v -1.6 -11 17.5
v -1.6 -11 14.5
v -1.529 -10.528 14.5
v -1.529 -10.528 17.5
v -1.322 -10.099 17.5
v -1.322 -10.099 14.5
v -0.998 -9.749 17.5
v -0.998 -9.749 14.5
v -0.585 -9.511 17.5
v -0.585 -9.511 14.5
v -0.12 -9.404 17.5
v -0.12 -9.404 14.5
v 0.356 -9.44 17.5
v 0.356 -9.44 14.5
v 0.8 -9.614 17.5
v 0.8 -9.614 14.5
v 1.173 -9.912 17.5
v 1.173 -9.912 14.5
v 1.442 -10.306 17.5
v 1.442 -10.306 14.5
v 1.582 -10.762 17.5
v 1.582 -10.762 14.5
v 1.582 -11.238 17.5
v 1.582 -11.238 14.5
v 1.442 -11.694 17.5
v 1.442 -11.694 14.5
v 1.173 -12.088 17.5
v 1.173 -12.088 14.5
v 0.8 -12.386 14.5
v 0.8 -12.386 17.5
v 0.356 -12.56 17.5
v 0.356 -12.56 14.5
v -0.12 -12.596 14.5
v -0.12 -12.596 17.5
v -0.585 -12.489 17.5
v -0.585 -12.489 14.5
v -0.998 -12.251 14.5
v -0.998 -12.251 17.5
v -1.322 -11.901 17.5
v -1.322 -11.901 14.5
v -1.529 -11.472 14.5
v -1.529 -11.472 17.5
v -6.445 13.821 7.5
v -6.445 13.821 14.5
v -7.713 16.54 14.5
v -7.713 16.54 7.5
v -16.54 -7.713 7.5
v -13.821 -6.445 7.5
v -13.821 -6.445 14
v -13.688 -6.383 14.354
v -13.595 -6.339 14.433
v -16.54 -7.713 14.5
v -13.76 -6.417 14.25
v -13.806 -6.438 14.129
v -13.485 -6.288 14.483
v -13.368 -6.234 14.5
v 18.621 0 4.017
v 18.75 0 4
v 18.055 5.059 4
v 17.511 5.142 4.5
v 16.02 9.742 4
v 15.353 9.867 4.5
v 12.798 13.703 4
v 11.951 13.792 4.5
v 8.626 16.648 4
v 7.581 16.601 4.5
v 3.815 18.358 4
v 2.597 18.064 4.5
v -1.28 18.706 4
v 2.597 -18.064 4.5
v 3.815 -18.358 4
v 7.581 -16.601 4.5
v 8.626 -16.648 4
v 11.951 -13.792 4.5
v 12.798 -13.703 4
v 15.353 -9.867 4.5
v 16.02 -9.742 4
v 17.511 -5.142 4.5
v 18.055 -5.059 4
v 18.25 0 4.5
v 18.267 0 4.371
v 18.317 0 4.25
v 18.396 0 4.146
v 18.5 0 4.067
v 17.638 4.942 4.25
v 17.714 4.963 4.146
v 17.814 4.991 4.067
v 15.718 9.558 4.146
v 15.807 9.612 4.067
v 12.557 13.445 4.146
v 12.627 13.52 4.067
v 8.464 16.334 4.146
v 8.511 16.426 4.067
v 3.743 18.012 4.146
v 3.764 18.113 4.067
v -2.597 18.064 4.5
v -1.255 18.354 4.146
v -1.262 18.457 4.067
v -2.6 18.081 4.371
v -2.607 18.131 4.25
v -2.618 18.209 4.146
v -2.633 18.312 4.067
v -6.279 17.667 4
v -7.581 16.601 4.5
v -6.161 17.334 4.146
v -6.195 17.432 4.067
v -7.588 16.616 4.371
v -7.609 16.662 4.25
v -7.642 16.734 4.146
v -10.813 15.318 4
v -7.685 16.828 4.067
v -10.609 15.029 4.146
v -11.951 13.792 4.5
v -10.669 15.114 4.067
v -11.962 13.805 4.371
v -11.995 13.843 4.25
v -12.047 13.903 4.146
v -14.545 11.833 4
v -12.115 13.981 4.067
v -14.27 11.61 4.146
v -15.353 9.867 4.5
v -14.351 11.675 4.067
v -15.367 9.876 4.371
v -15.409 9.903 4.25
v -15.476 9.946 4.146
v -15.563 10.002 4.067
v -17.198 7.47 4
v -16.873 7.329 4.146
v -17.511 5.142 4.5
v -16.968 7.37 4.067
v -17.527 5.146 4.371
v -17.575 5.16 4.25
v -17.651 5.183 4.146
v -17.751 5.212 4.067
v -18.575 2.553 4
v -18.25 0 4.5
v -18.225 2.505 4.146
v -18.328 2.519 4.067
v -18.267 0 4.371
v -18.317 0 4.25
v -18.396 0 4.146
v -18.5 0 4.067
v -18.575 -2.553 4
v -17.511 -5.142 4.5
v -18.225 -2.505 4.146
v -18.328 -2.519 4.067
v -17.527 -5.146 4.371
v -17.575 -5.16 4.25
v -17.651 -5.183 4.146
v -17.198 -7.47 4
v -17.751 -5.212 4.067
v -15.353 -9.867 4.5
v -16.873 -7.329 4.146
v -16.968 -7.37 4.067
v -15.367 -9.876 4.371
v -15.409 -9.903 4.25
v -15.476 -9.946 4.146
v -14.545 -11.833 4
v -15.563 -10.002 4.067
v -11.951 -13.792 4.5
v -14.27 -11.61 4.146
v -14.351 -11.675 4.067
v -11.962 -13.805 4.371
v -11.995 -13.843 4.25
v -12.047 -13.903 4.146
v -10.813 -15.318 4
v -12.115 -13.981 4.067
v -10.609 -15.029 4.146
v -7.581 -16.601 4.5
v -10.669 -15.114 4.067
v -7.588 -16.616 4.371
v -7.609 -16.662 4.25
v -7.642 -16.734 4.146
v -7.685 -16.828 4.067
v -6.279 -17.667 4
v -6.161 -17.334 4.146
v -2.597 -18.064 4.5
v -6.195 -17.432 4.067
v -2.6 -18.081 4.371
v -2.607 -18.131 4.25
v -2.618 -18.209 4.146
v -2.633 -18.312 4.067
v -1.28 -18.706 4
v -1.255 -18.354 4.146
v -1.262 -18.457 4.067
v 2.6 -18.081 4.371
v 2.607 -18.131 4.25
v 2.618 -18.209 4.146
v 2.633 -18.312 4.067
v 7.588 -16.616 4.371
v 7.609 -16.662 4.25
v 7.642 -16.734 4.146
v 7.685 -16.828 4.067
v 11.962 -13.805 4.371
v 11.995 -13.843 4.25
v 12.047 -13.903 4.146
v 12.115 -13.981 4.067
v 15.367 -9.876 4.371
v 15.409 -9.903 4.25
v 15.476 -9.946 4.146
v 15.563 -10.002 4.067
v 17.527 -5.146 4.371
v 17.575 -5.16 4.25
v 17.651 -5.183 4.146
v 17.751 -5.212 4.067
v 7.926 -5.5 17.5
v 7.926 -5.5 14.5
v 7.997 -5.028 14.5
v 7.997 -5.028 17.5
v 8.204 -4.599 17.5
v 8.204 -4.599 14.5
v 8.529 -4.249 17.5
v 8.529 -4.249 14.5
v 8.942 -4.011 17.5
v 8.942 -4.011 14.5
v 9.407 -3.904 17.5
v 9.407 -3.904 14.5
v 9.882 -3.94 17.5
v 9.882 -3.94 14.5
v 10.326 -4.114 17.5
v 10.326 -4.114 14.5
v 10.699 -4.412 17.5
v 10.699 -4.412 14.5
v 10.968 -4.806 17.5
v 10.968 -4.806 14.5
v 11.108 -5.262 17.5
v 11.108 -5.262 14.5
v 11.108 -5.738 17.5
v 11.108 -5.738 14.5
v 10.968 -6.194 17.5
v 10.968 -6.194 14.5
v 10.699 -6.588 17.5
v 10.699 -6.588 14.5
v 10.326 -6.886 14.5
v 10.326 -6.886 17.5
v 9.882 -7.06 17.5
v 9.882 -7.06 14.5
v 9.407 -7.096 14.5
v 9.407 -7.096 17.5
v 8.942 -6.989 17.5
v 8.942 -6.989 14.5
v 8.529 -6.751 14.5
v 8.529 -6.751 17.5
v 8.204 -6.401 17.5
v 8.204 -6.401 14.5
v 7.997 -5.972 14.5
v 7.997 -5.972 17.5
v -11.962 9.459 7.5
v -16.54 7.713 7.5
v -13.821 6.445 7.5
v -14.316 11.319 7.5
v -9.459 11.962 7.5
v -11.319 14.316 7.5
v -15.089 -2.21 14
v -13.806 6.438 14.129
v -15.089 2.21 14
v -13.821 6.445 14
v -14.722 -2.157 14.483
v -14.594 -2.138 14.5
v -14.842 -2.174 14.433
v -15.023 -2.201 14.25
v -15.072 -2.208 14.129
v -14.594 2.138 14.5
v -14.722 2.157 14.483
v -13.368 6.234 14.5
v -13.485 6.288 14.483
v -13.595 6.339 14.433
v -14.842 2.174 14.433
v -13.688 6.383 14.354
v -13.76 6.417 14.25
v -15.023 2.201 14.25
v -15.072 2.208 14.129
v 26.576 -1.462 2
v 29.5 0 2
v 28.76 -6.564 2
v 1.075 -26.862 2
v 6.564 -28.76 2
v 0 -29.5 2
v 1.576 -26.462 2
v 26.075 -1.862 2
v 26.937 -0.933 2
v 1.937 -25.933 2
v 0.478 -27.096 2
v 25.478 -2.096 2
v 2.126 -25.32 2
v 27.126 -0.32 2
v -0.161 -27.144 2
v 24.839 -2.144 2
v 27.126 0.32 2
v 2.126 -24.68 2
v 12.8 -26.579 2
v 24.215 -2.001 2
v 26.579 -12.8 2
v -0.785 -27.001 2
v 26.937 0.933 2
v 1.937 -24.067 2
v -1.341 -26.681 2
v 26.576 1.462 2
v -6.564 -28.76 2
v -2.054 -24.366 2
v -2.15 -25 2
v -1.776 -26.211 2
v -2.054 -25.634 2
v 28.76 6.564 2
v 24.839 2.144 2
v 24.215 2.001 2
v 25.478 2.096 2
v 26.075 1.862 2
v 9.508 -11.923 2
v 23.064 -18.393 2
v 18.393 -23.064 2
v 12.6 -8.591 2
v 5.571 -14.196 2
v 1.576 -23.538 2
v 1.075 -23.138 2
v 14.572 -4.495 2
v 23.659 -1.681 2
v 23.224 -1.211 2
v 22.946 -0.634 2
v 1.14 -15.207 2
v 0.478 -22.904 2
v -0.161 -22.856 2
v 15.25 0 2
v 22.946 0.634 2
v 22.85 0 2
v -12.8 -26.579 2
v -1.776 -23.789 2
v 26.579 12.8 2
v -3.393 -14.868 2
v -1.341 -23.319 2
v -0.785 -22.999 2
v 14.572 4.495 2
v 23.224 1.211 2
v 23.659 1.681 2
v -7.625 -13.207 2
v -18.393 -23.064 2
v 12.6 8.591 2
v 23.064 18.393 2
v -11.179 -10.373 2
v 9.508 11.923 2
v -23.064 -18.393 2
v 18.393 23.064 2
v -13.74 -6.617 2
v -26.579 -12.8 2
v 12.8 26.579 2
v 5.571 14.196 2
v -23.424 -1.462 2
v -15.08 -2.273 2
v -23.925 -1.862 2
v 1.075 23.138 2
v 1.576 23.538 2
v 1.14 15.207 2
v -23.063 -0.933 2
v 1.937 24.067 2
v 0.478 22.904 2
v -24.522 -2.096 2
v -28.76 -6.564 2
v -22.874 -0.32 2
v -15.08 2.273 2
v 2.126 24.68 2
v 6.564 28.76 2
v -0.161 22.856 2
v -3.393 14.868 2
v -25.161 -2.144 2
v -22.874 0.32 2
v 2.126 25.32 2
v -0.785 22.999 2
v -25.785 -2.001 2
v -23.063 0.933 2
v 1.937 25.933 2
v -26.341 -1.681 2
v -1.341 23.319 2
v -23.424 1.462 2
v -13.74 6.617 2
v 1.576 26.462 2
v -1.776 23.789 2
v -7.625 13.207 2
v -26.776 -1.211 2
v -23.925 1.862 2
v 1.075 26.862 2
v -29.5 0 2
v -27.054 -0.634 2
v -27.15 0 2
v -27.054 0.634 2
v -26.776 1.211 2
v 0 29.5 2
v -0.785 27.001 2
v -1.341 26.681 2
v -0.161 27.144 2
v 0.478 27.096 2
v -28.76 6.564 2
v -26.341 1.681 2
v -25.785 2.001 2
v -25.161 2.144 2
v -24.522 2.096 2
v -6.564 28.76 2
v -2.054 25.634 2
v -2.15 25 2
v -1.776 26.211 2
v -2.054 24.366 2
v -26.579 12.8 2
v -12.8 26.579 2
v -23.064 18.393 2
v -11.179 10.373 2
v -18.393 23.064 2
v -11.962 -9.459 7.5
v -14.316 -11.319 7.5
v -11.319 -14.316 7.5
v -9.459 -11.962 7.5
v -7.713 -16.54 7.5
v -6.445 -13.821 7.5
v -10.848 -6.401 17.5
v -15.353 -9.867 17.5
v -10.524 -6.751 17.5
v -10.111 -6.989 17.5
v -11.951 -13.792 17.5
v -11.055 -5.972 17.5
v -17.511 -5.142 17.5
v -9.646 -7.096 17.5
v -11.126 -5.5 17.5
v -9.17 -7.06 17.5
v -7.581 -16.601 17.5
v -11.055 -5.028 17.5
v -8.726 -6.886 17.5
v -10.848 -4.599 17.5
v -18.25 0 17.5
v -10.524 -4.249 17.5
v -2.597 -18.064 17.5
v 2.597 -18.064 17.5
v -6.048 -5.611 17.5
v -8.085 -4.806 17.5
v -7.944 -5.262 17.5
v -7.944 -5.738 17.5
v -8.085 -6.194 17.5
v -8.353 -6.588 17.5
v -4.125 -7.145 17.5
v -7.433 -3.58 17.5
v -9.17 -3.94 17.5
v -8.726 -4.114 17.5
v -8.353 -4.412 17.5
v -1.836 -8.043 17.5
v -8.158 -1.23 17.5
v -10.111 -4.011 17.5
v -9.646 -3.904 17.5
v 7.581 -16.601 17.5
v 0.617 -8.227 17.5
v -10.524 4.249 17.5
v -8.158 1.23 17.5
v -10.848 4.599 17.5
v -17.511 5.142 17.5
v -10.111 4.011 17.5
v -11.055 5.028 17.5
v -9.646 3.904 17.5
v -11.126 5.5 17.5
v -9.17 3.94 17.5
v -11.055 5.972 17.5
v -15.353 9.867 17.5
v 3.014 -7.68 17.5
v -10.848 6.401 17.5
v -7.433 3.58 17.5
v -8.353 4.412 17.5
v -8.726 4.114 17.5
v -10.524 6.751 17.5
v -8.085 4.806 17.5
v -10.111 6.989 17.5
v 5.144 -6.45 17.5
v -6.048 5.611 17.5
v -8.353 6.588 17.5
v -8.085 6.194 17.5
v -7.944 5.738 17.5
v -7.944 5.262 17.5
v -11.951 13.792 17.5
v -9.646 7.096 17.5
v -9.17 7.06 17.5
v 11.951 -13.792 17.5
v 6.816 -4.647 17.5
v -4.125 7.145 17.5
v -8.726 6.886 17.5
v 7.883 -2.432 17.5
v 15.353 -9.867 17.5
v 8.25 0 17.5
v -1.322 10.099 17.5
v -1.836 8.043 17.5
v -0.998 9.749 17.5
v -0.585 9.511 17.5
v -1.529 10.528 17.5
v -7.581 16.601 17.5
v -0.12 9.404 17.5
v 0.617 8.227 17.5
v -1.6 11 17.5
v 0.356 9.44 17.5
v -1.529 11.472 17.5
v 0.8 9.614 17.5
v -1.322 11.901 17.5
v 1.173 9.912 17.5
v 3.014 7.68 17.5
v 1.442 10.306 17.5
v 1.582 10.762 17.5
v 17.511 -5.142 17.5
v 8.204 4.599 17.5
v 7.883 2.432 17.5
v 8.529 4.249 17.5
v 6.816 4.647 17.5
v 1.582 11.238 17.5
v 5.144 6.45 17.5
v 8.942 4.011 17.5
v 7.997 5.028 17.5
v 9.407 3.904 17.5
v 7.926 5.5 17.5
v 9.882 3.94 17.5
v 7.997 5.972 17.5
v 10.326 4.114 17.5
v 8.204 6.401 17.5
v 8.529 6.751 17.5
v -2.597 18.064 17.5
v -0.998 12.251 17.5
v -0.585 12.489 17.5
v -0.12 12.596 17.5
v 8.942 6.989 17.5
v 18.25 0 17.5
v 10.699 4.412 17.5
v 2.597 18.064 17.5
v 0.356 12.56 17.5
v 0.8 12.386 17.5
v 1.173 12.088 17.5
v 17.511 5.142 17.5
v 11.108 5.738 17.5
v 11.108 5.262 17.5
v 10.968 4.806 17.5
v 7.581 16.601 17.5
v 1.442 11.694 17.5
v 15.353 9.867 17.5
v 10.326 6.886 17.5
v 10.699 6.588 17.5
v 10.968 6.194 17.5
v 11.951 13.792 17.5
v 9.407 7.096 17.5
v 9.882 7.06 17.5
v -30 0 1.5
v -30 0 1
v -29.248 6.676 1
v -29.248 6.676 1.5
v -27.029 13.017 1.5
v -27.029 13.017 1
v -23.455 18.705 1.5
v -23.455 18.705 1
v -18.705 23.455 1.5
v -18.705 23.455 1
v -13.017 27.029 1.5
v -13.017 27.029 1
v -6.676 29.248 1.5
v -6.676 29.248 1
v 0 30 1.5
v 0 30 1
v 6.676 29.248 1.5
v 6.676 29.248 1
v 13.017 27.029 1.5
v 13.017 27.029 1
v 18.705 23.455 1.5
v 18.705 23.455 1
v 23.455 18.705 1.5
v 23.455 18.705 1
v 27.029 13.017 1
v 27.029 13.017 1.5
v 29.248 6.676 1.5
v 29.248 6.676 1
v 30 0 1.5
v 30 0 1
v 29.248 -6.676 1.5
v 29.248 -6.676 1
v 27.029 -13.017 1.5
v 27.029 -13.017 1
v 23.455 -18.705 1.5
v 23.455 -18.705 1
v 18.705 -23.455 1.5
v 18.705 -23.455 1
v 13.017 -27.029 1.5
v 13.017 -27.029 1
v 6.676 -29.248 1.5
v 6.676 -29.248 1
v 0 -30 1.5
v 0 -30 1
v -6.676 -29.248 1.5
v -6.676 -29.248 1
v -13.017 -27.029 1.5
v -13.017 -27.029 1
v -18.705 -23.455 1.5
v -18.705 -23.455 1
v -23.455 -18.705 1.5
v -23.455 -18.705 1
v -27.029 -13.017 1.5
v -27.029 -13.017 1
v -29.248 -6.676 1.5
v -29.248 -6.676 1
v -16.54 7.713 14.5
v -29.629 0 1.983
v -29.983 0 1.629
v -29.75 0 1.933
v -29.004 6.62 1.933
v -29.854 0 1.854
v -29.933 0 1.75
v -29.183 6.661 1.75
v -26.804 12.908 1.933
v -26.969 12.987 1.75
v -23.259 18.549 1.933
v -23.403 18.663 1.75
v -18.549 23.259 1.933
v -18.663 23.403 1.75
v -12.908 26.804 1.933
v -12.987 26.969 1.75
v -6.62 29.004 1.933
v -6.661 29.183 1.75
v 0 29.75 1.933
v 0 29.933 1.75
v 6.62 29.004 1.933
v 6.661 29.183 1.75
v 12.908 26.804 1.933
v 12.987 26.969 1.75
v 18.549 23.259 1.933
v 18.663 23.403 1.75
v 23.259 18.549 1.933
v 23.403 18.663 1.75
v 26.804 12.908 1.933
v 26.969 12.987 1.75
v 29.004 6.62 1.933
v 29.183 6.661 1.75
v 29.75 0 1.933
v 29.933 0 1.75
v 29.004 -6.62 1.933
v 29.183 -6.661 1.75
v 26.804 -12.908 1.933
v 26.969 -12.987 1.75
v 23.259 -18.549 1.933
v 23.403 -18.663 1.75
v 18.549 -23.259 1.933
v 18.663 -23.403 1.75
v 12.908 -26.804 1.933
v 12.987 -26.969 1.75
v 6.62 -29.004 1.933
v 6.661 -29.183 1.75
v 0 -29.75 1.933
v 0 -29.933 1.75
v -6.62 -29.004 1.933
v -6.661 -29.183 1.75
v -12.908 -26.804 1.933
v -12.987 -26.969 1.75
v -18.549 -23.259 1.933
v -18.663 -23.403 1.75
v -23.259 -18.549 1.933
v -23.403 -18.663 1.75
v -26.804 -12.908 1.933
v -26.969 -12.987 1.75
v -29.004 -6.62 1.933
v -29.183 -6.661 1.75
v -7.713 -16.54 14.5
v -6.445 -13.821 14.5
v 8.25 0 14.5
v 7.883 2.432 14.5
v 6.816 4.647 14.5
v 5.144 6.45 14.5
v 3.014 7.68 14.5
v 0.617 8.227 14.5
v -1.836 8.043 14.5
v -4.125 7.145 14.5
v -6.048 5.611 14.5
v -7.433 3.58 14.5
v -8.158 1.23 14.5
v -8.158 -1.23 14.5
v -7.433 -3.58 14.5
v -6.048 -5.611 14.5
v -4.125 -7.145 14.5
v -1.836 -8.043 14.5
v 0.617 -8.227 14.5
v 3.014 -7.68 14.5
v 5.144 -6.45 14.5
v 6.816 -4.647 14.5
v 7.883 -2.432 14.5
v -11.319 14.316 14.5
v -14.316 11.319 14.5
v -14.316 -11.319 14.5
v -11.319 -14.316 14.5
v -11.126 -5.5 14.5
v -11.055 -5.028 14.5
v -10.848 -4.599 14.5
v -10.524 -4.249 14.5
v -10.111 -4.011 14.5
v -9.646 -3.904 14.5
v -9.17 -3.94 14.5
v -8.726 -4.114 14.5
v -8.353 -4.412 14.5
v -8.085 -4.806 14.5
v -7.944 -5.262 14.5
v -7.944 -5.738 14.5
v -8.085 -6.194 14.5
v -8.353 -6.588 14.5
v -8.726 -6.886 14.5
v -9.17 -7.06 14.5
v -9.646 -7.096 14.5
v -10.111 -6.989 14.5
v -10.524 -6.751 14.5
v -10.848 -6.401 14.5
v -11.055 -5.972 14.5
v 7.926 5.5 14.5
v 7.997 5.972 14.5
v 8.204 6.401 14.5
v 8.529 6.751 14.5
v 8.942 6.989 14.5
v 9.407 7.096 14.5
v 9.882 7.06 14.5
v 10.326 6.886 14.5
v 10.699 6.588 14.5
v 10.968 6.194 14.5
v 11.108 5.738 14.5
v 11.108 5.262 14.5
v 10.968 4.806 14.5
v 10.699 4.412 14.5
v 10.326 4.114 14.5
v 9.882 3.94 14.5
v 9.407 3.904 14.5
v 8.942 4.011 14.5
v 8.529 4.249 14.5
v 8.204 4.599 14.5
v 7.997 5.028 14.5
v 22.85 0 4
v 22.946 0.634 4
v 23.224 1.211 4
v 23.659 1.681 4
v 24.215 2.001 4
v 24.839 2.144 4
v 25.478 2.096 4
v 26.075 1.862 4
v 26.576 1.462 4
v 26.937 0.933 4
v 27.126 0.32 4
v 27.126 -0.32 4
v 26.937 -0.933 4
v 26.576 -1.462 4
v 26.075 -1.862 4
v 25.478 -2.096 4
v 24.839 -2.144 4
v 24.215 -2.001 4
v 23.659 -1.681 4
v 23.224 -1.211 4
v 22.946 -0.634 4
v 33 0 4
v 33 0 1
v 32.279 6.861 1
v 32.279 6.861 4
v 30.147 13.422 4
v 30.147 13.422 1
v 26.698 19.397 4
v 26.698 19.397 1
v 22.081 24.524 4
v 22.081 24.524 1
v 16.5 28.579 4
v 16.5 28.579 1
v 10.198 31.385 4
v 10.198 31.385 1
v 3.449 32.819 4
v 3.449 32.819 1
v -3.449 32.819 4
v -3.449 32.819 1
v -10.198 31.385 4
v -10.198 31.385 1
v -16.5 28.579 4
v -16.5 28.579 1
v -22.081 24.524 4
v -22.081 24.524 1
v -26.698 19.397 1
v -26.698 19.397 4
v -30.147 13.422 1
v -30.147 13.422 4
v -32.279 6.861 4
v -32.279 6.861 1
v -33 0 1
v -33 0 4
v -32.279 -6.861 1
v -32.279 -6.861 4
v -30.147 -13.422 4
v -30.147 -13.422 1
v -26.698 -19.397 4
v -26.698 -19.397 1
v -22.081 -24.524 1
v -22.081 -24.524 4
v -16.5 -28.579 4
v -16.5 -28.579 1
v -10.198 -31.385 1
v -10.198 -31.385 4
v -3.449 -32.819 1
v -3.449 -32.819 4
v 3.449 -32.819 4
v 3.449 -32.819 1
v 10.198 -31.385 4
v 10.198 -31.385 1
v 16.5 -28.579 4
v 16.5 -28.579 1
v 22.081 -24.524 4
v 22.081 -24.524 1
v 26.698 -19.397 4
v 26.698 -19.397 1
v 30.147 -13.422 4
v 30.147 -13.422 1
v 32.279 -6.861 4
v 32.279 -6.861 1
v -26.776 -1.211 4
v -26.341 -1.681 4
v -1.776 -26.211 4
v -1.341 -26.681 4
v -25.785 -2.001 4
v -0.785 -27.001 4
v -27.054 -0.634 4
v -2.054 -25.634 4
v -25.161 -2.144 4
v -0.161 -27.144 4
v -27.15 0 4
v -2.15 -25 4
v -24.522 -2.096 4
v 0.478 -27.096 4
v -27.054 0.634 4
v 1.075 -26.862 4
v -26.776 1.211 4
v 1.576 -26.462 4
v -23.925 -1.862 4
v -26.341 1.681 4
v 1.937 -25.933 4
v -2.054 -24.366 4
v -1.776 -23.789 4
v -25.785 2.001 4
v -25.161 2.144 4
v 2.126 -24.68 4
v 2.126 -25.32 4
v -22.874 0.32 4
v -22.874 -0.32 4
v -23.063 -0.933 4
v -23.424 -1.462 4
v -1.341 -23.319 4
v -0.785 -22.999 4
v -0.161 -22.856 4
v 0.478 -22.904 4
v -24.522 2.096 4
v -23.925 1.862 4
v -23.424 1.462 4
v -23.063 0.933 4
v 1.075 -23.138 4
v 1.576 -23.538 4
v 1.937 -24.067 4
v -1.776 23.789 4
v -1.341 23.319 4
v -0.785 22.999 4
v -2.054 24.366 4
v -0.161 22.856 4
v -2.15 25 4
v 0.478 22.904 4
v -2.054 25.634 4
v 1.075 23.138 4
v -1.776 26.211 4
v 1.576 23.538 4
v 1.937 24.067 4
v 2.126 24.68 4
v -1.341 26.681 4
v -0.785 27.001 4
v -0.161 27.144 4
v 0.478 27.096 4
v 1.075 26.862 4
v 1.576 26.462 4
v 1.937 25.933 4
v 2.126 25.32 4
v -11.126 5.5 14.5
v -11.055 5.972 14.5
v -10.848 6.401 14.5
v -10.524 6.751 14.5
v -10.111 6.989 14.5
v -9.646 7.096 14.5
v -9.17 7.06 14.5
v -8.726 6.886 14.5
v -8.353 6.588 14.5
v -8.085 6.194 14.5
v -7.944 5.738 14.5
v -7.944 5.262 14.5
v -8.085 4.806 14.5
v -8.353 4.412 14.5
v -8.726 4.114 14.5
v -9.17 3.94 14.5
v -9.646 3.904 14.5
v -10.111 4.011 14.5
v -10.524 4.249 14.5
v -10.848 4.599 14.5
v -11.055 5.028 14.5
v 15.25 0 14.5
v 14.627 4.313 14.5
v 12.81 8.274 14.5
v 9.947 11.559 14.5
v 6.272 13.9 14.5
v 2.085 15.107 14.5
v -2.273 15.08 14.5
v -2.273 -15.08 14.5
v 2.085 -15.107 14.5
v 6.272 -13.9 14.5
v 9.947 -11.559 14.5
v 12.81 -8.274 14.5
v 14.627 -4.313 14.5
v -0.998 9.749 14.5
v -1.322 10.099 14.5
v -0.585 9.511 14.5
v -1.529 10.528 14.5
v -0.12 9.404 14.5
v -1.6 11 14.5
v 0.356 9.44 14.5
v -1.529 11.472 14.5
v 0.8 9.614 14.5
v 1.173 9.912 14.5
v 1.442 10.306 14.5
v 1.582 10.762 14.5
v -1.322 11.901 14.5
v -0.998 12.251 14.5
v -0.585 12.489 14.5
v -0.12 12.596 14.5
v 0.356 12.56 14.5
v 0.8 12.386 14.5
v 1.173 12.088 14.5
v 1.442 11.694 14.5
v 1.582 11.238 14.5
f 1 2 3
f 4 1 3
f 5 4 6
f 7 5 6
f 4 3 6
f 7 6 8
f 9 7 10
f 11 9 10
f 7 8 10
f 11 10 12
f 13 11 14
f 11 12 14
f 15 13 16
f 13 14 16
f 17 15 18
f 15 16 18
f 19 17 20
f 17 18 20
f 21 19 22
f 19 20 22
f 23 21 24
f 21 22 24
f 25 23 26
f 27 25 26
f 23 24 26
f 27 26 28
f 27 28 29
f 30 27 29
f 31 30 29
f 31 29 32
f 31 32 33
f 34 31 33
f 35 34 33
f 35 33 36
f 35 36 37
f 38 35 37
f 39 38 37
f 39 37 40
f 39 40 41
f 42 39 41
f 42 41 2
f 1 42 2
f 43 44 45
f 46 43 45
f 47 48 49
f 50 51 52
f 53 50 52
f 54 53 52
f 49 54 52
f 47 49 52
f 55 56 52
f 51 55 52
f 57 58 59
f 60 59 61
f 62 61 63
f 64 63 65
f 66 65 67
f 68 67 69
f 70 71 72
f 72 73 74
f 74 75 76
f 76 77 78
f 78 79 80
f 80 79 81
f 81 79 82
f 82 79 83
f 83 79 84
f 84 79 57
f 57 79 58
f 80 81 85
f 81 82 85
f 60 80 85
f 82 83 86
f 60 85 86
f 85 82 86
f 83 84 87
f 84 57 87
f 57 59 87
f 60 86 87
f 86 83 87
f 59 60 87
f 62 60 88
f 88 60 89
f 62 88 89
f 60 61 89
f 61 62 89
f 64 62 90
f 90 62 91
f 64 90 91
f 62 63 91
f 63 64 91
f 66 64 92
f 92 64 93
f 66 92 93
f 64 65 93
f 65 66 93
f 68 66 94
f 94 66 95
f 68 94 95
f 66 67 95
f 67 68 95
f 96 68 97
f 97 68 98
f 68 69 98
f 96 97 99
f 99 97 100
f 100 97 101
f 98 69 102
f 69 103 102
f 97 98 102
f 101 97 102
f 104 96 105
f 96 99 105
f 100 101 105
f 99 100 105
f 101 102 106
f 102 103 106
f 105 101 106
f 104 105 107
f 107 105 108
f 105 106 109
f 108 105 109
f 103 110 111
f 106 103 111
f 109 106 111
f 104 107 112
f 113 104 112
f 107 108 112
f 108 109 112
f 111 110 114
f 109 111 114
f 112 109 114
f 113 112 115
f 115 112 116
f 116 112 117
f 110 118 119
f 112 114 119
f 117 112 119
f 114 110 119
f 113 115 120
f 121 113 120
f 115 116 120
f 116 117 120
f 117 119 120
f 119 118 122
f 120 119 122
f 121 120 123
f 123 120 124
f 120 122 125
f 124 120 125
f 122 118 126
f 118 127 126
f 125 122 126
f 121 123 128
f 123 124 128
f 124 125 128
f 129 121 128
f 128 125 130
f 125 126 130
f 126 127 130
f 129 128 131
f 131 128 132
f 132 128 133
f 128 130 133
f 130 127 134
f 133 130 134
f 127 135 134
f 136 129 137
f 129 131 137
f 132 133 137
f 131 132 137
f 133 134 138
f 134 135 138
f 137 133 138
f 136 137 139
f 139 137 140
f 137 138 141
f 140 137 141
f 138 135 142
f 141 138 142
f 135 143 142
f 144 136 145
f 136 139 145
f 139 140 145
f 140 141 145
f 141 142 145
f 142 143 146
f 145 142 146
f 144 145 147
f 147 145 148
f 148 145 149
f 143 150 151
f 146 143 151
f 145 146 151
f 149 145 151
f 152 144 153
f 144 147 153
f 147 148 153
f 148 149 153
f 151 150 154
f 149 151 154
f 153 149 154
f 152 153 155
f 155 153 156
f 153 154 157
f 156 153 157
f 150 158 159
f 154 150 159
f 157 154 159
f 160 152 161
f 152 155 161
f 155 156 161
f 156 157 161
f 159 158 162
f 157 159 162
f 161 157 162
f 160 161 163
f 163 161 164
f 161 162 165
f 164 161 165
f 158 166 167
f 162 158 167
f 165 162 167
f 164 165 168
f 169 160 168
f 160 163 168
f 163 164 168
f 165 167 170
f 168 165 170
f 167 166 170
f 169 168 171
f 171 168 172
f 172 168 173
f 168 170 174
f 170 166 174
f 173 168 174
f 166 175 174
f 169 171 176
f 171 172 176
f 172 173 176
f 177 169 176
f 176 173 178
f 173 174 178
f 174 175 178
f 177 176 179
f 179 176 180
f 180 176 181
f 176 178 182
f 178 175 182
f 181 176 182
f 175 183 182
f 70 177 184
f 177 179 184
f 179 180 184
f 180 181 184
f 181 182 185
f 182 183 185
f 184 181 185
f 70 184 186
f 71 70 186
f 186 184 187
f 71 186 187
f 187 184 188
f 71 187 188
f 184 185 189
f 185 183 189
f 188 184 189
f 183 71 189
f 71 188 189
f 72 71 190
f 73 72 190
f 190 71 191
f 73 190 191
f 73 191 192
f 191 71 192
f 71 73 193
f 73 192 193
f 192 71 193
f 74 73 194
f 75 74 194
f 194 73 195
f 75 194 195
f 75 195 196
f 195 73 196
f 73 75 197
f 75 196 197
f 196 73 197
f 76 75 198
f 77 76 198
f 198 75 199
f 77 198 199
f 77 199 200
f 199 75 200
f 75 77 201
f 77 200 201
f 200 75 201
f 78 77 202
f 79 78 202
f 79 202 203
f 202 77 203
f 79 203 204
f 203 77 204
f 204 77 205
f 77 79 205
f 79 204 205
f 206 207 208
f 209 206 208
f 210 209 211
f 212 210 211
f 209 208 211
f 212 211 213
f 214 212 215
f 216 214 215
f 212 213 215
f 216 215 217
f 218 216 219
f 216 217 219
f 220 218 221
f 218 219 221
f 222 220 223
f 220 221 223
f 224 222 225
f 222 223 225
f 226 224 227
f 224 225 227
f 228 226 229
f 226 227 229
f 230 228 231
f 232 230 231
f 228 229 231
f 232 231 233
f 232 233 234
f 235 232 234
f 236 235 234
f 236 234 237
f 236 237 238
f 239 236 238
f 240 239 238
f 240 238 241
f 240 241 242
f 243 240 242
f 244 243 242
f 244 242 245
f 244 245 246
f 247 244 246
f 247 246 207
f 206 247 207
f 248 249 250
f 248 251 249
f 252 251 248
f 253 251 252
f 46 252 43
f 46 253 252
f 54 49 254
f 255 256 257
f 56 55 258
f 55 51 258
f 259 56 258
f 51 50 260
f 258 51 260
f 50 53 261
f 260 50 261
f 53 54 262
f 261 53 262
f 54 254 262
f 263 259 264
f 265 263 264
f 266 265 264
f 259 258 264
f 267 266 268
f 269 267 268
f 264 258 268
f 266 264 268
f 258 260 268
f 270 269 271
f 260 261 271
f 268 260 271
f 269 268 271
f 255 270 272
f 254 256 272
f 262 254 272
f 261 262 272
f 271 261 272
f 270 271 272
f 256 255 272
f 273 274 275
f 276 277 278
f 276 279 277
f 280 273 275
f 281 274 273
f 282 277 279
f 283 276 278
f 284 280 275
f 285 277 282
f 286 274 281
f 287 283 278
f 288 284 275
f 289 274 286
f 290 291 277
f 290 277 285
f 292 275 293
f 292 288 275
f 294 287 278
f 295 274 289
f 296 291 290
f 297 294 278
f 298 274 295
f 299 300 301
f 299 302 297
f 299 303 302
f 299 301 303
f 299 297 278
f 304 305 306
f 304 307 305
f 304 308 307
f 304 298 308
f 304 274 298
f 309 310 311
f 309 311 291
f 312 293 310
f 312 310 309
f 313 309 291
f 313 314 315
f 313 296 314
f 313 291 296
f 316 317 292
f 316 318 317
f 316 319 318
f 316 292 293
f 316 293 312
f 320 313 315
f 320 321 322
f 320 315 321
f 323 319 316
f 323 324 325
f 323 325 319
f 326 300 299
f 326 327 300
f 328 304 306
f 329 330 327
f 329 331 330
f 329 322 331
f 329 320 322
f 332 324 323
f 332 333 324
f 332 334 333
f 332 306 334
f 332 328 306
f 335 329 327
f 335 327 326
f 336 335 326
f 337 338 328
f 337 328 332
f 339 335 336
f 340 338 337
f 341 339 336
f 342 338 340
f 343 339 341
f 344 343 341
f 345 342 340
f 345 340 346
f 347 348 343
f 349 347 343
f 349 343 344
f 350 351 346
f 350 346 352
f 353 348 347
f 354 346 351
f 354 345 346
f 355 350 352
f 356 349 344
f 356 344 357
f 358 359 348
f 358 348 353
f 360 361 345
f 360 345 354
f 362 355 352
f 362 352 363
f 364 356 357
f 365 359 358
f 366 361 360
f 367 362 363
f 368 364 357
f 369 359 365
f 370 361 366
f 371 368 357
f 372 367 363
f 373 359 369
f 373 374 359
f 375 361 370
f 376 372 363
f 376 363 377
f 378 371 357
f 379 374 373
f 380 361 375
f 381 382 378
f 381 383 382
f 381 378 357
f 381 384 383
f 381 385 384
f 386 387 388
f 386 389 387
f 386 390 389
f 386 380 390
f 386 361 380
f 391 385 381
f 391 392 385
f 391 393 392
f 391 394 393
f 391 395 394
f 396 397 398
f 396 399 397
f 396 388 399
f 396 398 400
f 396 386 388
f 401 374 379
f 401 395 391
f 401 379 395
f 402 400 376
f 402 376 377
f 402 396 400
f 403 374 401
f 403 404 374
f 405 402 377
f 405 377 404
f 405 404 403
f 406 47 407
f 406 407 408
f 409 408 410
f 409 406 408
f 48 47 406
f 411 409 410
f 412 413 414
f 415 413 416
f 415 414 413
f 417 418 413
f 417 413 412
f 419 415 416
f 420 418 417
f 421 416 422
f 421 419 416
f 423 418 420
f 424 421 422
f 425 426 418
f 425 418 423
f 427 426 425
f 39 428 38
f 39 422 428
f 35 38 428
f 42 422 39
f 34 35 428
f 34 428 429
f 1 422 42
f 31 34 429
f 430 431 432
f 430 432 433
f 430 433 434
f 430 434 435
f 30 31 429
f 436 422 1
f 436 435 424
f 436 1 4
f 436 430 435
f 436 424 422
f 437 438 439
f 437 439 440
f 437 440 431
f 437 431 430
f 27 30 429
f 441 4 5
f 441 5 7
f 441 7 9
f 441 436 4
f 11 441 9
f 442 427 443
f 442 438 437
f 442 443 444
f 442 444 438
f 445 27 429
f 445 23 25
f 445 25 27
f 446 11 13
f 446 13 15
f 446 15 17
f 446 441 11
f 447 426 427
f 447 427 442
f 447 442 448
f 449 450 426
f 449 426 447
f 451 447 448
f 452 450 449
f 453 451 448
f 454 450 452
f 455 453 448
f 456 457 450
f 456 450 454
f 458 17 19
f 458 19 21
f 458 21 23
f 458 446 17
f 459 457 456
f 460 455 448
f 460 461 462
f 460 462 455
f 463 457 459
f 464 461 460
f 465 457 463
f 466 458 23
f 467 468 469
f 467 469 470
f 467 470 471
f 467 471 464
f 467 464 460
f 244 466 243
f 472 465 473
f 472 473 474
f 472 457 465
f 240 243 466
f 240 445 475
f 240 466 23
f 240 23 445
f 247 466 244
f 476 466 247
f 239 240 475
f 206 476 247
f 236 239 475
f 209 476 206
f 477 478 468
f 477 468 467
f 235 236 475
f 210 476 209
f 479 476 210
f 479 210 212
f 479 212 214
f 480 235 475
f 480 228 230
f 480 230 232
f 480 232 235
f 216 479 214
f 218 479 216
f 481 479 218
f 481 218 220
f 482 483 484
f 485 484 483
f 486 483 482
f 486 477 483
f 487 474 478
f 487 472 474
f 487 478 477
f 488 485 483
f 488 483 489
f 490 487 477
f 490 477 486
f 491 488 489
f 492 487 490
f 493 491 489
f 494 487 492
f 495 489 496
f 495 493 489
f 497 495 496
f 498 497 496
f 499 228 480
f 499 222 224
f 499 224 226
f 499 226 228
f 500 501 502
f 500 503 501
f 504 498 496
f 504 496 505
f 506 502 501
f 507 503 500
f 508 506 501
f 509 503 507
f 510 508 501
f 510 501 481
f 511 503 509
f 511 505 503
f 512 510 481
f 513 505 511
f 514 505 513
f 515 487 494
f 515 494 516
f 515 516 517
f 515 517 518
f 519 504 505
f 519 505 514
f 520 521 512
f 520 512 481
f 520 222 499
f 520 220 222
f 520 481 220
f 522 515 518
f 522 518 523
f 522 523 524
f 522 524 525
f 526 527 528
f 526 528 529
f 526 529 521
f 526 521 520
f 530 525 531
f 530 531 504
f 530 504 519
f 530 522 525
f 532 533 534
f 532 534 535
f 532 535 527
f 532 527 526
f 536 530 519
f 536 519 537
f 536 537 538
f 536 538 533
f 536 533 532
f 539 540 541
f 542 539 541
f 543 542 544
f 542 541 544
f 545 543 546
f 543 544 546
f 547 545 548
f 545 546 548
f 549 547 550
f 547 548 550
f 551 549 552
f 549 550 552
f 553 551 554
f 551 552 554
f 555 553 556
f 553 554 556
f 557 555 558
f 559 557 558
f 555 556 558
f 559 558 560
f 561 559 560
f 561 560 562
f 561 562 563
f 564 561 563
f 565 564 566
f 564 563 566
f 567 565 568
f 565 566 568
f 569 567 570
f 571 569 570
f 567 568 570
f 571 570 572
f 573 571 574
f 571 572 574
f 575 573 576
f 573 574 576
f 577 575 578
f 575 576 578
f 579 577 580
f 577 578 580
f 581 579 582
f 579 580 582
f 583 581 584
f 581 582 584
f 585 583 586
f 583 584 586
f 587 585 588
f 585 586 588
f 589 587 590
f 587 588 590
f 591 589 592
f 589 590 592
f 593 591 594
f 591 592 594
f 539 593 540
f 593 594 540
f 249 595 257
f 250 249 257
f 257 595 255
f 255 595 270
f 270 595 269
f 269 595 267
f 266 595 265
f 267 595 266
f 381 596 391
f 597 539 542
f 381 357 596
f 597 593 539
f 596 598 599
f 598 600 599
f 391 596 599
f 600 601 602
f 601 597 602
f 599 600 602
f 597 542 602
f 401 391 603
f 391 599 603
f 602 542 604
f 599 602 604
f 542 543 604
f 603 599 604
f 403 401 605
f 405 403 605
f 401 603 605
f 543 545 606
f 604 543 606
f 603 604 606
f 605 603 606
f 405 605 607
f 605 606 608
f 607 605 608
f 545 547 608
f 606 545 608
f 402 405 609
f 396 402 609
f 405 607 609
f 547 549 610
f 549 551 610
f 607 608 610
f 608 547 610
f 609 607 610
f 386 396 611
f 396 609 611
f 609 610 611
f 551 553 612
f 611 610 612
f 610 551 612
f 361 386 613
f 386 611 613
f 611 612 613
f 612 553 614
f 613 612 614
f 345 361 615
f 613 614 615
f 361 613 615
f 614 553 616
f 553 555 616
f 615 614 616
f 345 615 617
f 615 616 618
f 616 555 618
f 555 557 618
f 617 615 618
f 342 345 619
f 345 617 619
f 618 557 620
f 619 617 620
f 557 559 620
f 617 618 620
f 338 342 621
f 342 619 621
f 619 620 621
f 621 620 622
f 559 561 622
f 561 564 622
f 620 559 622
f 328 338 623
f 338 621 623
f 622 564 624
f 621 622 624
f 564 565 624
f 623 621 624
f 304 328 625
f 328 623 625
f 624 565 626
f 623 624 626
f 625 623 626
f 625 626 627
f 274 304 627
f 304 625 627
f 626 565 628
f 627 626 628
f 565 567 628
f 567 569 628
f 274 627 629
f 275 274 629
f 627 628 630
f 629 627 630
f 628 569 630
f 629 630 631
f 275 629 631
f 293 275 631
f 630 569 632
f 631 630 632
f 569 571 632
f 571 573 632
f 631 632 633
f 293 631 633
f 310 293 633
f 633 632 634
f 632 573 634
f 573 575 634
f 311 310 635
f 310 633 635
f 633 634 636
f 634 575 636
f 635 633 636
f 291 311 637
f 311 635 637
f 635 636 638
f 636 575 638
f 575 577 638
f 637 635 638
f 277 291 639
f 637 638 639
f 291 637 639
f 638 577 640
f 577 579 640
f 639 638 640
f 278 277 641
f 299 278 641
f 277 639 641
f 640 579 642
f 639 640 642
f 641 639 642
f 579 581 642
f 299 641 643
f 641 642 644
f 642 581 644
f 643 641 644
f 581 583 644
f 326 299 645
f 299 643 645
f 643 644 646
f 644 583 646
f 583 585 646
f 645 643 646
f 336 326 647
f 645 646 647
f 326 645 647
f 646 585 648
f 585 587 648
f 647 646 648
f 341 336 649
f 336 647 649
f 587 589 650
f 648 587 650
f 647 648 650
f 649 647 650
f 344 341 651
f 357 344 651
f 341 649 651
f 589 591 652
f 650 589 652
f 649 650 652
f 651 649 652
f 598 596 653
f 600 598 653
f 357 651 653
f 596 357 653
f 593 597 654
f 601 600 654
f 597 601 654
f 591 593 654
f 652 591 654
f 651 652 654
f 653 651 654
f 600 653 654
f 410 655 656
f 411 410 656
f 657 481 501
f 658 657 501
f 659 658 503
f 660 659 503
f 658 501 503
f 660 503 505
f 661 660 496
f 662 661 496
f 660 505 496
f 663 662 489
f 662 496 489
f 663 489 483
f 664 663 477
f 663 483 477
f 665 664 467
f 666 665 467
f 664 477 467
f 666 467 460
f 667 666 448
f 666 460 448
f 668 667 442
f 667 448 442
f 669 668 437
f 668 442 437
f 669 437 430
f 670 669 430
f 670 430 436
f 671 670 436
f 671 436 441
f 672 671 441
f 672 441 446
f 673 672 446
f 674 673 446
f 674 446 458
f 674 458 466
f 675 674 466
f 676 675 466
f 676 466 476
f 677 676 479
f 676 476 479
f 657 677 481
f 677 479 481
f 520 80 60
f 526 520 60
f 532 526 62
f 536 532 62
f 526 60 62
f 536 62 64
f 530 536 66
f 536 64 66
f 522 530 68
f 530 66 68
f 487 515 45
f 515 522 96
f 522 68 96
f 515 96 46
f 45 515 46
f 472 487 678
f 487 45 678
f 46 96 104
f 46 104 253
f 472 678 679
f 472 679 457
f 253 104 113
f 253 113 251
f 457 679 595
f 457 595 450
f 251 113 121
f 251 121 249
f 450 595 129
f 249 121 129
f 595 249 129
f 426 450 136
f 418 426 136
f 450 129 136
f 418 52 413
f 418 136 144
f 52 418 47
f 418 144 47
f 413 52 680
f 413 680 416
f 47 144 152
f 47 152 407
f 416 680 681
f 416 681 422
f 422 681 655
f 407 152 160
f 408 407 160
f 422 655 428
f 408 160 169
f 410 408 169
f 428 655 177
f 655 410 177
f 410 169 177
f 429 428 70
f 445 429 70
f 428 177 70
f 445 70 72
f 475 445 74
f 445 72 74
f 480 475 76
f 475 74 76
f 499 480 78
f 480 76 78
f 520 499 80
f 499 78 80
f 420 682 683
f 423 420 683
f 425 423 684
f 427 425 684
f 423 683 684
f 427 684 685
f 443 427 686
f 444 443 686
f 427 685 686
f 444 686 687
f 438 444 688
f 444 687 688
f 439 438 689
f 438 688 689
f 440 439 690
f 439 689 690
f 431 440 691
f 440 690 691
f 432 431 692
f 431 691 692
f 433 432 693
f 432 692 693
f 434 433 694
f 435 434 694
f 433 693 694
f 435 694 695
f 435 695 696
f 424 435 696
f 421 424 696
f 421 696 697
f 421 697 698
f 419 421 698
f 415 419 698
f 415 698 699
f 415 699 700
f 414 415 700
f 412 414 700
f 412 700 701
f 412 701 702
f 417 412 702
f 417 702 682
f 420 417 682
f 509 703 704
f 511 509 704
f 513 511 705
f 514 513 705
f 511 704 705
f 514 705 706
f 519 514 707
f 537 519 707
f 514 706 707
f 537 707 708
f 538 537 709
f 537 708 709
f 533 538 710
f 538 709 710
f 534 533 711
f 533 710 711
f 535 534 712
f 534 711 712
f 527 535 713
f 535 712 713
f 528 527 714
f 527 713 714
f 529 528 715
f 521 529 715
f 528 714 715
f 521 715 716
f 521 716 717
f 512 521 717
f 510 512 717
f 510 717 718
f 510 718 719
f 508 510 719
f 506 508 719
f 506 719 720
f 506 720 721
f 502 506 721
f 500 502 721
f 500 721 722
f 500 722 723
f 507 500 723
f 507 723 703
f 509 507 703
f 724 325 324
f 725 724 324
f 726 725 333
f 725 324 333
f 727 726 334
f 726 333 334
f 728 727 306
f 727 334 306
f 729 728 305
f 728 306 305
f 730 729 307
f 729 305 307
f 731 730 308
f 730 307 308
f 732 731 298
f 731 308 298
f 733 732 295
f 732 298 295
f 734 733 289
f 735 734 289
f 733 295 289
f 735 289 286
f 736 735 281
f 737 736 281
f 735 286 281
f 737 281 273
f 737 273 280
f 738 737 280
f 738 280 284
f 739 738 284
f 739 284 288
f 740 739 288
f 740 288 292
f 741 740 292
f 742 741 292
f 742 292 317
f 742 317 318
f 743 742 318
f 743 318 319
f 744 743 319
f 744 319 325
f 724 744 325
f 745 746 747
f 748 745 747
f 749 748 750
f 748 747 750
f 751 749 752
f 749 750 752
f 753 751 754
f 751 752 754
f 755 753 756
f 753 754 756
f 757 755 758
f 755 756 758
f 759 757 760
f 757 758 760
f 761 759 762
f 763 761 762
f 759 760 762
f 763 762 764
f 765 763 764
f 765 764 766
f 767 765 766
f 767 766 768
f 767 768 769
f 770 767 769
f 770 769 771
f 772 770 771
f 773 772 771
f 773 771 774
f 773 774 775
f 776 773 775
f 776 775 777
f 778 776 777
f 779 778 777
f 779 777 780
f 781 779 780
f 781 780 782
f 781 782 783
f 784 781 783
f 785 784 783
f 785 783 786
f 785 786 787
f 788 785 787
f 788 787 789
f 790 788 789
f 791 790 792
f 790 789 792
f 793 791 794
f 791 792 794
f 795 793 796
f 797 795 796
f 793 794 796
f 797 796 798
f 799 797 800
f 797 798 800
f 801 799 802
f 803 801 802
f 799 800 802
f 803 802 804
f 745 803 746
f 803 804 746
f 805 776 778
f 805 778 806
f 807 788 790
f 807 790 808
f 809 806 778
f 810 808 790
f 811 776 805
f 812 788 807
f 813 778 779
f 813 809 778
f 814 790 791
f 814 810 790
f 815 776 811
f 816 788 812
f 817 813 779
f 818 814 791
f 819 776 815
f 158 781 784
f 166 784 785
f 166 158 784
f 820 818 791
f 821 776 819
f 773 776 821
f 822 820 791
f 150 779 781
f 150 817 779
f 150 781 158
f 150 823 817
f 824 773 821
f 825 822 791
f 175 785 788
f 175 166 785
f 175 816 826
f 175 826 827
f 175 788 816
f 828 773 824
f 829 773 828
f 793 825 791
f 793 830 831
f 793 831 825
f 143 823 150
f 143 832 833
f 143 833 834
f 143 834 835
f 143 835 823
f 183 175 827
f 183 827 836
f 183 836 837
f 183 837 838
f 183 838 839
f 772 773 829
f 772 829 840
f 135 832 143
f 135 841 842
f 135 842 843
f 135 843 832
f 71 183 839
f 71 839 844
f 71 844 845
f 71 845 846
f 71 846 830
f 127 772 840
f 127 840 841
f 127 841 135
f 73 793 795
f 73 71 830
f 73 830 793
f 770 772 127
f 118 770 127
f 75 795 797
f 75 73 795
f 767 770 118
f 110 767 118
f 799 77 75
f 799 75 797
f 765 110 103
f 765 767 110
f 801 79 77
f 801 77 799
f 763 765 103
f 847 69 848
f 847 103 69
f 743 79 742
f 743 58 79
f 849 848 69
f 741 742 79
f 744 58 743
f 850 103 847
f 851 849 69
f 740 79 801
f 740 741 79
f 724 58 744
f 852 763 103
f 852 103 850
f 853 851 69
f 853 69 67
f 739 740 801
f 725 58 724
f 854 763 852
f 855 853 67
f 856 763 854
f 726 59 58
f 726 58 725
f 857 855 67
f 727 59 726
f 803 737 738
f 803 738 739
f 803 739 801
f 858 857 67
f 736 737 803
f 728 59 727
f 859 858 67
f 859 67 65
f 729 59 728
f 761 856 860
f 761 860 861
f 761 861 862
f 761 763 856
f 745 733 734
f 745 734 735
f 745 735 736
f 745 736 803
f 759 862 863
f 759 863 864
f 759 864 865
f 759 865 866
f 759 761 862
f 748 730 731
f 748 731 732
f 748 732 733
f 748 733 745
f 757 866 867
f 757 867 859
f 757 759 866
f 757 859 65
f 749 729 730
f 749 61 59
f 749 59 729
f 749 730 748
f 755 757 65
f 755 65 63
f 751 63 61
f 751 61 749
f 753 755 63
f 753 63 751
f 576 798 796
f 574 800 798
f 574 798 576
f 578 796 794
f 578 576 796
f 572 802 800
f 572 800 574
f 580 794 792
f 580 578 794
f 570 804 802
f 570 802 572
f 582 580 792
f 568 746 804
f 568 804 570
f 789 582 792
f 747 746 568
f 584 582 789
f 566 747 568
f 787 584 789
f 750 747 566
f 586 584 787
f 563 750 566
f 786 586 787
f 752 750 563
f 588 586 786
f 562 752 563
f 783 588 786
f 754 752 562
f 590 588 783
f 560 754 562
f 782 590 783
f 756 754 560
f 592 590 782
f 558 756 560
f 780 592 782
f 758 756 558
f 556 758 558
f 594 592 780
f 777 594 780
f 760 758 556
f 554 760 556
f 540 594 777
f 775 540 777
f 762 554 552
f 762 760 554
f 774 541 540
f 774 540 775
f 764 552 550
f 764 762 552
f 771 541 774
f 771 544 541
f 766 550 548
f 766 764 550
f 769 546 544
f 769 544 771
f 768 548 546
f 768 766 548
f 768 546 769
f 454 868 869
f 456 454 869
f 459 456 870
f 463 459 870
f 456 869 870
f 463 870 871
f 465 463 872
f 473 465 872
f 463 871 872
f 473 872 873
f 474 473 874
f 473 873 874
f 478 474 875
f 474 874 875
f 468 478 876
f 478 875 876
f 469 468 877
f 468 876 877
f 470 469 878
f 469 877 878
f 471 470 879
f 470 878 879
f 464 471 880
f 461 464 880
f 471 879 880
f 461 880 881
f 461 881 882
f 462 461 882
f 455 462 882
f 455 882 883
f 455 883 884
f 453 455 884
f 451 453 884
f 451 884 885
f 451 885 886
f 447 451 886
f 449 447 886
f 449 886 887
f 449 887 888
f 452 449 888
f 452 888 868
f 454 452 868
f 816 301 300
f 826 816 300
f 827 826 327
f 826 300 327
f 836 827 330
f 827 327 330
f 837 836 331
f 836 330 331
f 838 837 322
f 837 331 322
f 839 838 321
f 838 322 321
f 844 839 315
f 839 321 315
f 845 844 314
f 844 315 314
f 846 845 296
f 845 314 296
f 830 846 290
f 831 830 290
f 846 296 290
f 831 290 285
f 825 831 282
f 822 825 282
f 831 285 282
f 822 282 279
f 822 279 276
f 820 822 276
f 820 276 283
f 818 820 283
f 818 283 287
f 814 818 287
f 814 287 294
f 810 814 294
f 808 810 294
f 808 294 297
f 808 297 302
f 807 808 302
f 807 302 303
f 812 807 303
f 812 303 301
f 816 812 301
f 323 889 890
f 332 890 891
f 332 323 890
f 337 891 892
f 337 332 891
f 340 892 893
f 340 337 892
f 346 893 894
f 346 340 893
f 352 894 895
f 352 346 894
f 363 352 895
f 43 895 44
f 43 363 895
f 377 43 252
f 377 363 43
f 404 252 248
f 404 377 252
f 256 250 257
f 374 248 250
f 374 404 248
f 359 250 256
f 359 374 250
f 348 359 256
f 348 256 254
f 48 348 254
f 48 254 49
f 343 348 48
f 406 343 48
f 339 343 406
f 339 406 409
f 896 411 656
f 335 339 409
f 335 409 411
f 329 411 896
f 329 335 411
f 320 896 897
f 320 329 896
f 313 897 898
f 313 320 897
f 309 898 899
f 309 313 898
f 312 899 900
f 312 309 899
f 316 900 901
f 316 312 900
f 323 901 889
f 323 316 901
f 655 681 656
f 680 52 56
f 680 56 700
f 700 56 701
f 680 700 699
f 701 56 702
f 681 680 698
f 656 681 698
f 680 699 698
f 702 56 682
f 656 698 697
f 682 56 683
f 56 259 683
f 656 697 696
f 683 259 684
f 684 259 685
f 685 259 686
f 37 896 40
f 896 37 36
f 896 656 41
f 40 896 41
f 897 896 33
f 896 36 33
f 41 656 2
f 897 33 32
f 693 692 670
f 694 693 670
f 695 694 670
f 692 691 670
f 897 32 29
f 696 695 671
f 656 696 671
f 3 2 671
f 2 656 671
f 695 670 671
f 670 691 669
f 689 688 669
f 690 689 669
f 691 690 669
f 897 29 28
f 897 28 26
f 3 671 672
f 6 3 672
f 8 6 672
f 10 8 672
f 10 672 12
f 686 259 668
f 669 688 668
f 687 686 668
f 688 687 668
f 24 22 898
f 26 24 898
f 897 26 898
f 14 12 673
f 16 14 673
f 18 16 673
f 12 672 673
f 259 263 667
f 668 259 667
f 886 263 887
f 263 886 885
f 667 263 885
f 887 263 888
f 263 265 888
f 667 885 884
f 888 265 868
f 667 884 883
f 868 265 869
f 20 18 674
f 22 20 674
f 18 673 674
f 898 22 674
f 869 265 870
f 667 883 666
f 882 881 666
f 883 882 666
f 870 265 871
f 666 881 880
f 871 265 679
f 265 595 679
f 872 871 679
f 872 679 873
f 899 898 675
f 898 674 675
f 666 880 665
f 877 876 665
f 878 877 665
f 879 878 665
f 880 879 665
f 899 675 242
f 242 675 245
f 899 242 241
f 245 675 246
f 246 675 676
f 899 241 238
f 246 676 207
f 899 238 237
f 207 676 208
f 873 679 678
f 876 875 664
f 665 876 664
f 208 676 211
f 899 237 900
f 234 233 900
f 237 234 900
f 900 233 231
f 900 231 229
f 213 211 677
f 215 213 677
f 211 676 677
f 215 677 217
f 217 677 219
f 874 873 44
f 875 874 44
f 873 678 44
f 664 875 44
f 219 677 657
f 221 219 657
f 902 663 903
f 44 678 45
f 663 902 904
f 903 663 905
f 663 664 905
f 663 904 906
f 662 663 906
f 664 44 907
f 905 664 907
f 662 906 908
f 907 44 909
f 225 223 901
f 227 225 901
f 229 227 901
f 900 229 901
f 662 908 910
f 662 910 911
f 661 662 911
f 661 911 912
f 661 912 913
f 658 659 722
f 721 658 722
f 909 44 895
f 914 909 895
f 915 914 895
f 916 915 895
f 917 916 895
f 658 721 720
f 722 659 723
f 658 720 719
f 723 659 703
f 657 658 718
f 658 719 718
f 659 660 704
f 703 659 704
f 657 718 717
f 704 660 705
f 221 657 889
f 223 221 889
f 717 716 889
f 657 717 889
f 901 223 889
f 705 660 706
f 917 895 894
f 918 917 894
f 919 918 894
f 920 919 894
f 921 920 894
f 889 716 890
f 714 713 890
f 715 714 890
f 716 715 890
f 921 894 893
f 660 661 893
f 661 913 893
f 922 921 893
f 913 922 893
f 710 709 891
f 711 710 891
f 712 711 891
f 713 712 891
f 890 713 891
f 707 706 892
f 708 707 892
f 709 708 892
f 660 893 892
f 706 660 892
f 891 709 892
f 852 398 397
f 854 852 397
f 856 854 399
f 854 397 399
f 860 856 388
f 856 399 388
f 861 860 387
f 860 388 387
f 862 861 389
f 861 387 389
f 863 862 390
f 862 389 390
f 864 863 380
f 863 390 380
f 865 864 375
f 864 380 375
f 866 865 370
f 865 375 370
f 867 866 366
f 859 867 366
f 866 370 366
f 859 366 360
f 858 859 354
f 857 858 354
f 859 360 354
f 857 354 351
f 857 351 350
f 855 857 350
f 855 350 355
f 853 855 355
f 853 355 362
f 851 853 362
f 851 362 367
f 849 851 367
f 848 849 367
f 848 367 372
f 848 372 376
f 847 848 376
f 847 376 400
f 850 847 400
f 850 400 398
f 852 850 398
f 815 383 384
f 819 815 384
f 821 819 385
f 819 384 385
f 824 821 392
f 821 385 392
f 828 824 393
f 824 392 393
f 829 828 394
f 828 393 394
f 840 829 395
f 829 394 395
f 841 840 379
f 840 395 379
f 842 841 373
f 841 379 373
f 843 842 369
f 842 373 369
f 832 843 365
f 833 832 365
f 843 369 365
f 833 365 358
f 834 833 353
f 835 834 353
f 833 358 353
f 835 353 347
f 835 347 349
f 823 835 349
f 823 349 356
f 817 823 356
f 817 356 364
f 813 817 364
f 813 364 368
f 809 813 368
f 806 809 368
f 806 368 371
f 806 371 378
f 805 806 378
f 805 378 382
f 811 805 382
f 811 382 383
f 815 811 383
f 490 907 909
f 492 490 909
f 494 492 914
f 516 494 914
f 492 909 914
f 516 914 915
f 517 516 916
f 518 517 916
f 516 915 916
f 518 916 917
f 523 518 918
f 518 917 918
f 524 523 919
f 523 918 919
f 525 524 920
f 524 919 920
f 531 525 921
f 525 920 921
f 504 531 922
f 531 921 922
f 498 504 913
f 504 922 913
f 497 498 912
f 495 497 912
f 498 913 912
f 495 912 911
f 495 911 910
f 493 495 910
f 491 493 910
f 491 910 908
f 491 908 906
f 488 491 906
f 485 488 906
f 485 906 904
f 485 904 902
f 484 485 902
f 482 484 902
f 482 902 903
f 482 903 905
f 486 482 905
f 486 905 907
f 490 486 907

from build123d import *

# Parameters (mm, degrees)
SKETCH1_R            = 33
SKETCH1_R_2          = 15.25
BOSS_EXTRUDE1_DEPTH  = 4
SKETCH2_R            = 18.25
SKETCH2_R_2          = 15.25
BOSS_EXTRUDE2_DEPTH  = 13.5
SKETCH3_R            = 18.25
SKETCH3_R_2          = 8.25
BOSS_EXTRUDE3_DEPTH  = 3
M3_CLEARANCE_HOLE2_D = 3.2
CUT_EXTRUDE2_DEPTH   = 7
SKETCH10_R           = 35
CUT_EXTRUDE3_DEPTH   = 1
M4_CLEARANCE_HOLE1_D = 4.3
FILLET1_R            = 0.5
FILLET2_R            = 0.5
SKETCH13_R           = 30
CUT_EXTRUDE4_DEPTH   = 1
FILLET3_R            = 0.5


with BuildPart() as part:
    # Sketch1 → Boss-Extrude1 (new body)
    with BuildSketch(Plane.XY):
        Circle(SKETCH1_R)
        Circle(SKETCH1_R_2, mode=Mode.SUBTRACT)
    extrude(amount=BOSS_EXTRUDE1_DEPTH)

    # Sketch2 → Boss-Extrude2 (add)
    with BuildSketch(Plane.XY.offset(4)):
        Circle(SKETCH2_R)
        Circle(SKETCH2_R_2, mode=Mode.SUBTRACT)
    extrude(amount=BOSS_EXTRUDE2_DEPTH)

    # Sketch3 → Boss-Extrude3 (add)
    with BuildSketch(Plane.XY.offset(17.5)):
        Circle(SKETCH3_R)
        Circle(SKETCH3_R_2, mode=Mode.SUBTRACT)
    extrude(amount=-BOSS_EXTRUDE3_DEPTH)

    # M3 Clearance Hole2 (through all)
    with Locations(Plane.XY.offset(17.5)):
        with Locations((0, 11), (9.526279442, 5.5), (9.526279442, -5.5), (0, -11), (-9.526279442, -5.5), (-9.526279442, 5.5), (0, 0)):
            Hole(M3_CLEARANCE_HOLE2_D / 2)

    # Sketch9 → Cut-Extrude2 (cut)
    with BuildSketch(Plane.XY.offset(14.5)):
        with BuildLine():
            ThreePointArc((-12.688309019, 5.916655664), (-9.899494937, 9.899494937), (-5.916655664, 12.688309019))
            Line((-5.916655664, 12.688309019), (-7.712783277, 16.540117113))
            ThreePointArc((-7.712783277, 16.540117113), (-12.904698757, 12.904698757), (-16.540117113, 7.712783277))
            Line((-16.540117113, 7.712783277), (-12.688309019, 5.916655664))
        make_face()
        with BuildLine():
            Line((-7.712783277, -16.540117113), (-5.916655664, -12.688309019))
            ThreePointArc((-5.916655664, -12.688309019), (-9.899494937, -9.899494937), (-12.688309019, -5.916655664))
            Line((-12.688309019, -5.916655664), (-16.540117113, -7.712783277))
            ThreePointArc((-16.540117113, -7.712783277), (-12.904698757, -12.904698757), (-7.712783277, -16.540117113))
        make_face()
    extrude(amount=-CUT_EXTRUDE2_DEPTH, mode=Mode.SUBTRACT)

    # Sketch10 → Cut-Extrude3 (cut)
    with BuildSketch(Plane(origin=(0, 0, 0), x_dir=(-1, 0, 0), z_dir=(0, 0, -1))):
        Circle(SKETCH10_R)
    extrude(amount=-CUT_EXTRUDE3_DEPTH, mode=Mode.SUBTRACT)

    # M4 Clearance Hole1 (through all)
    with Locations(Plane.XY.offset(4)):
        with Locations((0, 25), (25, 0), (0, -25), (-25, 0), (0, 0)):
            Hole(M4_CLEARANCE_HOLE1_D / 2)

    # Fillet1
    fillet1_edges = [part.edges().sort_by_distance(p)[0] for p in [
        (-18.25, 0, 4),
        (-15.25, 0, 14.5),
    ]]
    fillet(fillet1_edges, radius=FILLET1_R)

    # Fillet2
    fillet2_edges = [part.edges().sort_by_distance(p)[0] for p in [
        (-15.25, 0, 1),
    ]]
    fillet(fillet2_edges, radius=FILLET2_R)

    # Sketch13 → Cut-Extrude4 (cut)
    with BuildSketch(Plane(origin=(0, 0, 1), x_dir=(-1, 0, 0), z_dir=(0, 0, -1))):
        Circle(SKETCH13_R)
    extrude(amount=-CUT_EXTRUDE4_DEPTH, mode=Mode.SUBTRACT)

    # Fillet3
    fillet3_edges = [part.edges().sort_by_distance(p)[0] for p in [
        (30, 0, 2),
    ]]
    fillet(fillet3_edges, radius=FILLET3_R)


solid = part.part
